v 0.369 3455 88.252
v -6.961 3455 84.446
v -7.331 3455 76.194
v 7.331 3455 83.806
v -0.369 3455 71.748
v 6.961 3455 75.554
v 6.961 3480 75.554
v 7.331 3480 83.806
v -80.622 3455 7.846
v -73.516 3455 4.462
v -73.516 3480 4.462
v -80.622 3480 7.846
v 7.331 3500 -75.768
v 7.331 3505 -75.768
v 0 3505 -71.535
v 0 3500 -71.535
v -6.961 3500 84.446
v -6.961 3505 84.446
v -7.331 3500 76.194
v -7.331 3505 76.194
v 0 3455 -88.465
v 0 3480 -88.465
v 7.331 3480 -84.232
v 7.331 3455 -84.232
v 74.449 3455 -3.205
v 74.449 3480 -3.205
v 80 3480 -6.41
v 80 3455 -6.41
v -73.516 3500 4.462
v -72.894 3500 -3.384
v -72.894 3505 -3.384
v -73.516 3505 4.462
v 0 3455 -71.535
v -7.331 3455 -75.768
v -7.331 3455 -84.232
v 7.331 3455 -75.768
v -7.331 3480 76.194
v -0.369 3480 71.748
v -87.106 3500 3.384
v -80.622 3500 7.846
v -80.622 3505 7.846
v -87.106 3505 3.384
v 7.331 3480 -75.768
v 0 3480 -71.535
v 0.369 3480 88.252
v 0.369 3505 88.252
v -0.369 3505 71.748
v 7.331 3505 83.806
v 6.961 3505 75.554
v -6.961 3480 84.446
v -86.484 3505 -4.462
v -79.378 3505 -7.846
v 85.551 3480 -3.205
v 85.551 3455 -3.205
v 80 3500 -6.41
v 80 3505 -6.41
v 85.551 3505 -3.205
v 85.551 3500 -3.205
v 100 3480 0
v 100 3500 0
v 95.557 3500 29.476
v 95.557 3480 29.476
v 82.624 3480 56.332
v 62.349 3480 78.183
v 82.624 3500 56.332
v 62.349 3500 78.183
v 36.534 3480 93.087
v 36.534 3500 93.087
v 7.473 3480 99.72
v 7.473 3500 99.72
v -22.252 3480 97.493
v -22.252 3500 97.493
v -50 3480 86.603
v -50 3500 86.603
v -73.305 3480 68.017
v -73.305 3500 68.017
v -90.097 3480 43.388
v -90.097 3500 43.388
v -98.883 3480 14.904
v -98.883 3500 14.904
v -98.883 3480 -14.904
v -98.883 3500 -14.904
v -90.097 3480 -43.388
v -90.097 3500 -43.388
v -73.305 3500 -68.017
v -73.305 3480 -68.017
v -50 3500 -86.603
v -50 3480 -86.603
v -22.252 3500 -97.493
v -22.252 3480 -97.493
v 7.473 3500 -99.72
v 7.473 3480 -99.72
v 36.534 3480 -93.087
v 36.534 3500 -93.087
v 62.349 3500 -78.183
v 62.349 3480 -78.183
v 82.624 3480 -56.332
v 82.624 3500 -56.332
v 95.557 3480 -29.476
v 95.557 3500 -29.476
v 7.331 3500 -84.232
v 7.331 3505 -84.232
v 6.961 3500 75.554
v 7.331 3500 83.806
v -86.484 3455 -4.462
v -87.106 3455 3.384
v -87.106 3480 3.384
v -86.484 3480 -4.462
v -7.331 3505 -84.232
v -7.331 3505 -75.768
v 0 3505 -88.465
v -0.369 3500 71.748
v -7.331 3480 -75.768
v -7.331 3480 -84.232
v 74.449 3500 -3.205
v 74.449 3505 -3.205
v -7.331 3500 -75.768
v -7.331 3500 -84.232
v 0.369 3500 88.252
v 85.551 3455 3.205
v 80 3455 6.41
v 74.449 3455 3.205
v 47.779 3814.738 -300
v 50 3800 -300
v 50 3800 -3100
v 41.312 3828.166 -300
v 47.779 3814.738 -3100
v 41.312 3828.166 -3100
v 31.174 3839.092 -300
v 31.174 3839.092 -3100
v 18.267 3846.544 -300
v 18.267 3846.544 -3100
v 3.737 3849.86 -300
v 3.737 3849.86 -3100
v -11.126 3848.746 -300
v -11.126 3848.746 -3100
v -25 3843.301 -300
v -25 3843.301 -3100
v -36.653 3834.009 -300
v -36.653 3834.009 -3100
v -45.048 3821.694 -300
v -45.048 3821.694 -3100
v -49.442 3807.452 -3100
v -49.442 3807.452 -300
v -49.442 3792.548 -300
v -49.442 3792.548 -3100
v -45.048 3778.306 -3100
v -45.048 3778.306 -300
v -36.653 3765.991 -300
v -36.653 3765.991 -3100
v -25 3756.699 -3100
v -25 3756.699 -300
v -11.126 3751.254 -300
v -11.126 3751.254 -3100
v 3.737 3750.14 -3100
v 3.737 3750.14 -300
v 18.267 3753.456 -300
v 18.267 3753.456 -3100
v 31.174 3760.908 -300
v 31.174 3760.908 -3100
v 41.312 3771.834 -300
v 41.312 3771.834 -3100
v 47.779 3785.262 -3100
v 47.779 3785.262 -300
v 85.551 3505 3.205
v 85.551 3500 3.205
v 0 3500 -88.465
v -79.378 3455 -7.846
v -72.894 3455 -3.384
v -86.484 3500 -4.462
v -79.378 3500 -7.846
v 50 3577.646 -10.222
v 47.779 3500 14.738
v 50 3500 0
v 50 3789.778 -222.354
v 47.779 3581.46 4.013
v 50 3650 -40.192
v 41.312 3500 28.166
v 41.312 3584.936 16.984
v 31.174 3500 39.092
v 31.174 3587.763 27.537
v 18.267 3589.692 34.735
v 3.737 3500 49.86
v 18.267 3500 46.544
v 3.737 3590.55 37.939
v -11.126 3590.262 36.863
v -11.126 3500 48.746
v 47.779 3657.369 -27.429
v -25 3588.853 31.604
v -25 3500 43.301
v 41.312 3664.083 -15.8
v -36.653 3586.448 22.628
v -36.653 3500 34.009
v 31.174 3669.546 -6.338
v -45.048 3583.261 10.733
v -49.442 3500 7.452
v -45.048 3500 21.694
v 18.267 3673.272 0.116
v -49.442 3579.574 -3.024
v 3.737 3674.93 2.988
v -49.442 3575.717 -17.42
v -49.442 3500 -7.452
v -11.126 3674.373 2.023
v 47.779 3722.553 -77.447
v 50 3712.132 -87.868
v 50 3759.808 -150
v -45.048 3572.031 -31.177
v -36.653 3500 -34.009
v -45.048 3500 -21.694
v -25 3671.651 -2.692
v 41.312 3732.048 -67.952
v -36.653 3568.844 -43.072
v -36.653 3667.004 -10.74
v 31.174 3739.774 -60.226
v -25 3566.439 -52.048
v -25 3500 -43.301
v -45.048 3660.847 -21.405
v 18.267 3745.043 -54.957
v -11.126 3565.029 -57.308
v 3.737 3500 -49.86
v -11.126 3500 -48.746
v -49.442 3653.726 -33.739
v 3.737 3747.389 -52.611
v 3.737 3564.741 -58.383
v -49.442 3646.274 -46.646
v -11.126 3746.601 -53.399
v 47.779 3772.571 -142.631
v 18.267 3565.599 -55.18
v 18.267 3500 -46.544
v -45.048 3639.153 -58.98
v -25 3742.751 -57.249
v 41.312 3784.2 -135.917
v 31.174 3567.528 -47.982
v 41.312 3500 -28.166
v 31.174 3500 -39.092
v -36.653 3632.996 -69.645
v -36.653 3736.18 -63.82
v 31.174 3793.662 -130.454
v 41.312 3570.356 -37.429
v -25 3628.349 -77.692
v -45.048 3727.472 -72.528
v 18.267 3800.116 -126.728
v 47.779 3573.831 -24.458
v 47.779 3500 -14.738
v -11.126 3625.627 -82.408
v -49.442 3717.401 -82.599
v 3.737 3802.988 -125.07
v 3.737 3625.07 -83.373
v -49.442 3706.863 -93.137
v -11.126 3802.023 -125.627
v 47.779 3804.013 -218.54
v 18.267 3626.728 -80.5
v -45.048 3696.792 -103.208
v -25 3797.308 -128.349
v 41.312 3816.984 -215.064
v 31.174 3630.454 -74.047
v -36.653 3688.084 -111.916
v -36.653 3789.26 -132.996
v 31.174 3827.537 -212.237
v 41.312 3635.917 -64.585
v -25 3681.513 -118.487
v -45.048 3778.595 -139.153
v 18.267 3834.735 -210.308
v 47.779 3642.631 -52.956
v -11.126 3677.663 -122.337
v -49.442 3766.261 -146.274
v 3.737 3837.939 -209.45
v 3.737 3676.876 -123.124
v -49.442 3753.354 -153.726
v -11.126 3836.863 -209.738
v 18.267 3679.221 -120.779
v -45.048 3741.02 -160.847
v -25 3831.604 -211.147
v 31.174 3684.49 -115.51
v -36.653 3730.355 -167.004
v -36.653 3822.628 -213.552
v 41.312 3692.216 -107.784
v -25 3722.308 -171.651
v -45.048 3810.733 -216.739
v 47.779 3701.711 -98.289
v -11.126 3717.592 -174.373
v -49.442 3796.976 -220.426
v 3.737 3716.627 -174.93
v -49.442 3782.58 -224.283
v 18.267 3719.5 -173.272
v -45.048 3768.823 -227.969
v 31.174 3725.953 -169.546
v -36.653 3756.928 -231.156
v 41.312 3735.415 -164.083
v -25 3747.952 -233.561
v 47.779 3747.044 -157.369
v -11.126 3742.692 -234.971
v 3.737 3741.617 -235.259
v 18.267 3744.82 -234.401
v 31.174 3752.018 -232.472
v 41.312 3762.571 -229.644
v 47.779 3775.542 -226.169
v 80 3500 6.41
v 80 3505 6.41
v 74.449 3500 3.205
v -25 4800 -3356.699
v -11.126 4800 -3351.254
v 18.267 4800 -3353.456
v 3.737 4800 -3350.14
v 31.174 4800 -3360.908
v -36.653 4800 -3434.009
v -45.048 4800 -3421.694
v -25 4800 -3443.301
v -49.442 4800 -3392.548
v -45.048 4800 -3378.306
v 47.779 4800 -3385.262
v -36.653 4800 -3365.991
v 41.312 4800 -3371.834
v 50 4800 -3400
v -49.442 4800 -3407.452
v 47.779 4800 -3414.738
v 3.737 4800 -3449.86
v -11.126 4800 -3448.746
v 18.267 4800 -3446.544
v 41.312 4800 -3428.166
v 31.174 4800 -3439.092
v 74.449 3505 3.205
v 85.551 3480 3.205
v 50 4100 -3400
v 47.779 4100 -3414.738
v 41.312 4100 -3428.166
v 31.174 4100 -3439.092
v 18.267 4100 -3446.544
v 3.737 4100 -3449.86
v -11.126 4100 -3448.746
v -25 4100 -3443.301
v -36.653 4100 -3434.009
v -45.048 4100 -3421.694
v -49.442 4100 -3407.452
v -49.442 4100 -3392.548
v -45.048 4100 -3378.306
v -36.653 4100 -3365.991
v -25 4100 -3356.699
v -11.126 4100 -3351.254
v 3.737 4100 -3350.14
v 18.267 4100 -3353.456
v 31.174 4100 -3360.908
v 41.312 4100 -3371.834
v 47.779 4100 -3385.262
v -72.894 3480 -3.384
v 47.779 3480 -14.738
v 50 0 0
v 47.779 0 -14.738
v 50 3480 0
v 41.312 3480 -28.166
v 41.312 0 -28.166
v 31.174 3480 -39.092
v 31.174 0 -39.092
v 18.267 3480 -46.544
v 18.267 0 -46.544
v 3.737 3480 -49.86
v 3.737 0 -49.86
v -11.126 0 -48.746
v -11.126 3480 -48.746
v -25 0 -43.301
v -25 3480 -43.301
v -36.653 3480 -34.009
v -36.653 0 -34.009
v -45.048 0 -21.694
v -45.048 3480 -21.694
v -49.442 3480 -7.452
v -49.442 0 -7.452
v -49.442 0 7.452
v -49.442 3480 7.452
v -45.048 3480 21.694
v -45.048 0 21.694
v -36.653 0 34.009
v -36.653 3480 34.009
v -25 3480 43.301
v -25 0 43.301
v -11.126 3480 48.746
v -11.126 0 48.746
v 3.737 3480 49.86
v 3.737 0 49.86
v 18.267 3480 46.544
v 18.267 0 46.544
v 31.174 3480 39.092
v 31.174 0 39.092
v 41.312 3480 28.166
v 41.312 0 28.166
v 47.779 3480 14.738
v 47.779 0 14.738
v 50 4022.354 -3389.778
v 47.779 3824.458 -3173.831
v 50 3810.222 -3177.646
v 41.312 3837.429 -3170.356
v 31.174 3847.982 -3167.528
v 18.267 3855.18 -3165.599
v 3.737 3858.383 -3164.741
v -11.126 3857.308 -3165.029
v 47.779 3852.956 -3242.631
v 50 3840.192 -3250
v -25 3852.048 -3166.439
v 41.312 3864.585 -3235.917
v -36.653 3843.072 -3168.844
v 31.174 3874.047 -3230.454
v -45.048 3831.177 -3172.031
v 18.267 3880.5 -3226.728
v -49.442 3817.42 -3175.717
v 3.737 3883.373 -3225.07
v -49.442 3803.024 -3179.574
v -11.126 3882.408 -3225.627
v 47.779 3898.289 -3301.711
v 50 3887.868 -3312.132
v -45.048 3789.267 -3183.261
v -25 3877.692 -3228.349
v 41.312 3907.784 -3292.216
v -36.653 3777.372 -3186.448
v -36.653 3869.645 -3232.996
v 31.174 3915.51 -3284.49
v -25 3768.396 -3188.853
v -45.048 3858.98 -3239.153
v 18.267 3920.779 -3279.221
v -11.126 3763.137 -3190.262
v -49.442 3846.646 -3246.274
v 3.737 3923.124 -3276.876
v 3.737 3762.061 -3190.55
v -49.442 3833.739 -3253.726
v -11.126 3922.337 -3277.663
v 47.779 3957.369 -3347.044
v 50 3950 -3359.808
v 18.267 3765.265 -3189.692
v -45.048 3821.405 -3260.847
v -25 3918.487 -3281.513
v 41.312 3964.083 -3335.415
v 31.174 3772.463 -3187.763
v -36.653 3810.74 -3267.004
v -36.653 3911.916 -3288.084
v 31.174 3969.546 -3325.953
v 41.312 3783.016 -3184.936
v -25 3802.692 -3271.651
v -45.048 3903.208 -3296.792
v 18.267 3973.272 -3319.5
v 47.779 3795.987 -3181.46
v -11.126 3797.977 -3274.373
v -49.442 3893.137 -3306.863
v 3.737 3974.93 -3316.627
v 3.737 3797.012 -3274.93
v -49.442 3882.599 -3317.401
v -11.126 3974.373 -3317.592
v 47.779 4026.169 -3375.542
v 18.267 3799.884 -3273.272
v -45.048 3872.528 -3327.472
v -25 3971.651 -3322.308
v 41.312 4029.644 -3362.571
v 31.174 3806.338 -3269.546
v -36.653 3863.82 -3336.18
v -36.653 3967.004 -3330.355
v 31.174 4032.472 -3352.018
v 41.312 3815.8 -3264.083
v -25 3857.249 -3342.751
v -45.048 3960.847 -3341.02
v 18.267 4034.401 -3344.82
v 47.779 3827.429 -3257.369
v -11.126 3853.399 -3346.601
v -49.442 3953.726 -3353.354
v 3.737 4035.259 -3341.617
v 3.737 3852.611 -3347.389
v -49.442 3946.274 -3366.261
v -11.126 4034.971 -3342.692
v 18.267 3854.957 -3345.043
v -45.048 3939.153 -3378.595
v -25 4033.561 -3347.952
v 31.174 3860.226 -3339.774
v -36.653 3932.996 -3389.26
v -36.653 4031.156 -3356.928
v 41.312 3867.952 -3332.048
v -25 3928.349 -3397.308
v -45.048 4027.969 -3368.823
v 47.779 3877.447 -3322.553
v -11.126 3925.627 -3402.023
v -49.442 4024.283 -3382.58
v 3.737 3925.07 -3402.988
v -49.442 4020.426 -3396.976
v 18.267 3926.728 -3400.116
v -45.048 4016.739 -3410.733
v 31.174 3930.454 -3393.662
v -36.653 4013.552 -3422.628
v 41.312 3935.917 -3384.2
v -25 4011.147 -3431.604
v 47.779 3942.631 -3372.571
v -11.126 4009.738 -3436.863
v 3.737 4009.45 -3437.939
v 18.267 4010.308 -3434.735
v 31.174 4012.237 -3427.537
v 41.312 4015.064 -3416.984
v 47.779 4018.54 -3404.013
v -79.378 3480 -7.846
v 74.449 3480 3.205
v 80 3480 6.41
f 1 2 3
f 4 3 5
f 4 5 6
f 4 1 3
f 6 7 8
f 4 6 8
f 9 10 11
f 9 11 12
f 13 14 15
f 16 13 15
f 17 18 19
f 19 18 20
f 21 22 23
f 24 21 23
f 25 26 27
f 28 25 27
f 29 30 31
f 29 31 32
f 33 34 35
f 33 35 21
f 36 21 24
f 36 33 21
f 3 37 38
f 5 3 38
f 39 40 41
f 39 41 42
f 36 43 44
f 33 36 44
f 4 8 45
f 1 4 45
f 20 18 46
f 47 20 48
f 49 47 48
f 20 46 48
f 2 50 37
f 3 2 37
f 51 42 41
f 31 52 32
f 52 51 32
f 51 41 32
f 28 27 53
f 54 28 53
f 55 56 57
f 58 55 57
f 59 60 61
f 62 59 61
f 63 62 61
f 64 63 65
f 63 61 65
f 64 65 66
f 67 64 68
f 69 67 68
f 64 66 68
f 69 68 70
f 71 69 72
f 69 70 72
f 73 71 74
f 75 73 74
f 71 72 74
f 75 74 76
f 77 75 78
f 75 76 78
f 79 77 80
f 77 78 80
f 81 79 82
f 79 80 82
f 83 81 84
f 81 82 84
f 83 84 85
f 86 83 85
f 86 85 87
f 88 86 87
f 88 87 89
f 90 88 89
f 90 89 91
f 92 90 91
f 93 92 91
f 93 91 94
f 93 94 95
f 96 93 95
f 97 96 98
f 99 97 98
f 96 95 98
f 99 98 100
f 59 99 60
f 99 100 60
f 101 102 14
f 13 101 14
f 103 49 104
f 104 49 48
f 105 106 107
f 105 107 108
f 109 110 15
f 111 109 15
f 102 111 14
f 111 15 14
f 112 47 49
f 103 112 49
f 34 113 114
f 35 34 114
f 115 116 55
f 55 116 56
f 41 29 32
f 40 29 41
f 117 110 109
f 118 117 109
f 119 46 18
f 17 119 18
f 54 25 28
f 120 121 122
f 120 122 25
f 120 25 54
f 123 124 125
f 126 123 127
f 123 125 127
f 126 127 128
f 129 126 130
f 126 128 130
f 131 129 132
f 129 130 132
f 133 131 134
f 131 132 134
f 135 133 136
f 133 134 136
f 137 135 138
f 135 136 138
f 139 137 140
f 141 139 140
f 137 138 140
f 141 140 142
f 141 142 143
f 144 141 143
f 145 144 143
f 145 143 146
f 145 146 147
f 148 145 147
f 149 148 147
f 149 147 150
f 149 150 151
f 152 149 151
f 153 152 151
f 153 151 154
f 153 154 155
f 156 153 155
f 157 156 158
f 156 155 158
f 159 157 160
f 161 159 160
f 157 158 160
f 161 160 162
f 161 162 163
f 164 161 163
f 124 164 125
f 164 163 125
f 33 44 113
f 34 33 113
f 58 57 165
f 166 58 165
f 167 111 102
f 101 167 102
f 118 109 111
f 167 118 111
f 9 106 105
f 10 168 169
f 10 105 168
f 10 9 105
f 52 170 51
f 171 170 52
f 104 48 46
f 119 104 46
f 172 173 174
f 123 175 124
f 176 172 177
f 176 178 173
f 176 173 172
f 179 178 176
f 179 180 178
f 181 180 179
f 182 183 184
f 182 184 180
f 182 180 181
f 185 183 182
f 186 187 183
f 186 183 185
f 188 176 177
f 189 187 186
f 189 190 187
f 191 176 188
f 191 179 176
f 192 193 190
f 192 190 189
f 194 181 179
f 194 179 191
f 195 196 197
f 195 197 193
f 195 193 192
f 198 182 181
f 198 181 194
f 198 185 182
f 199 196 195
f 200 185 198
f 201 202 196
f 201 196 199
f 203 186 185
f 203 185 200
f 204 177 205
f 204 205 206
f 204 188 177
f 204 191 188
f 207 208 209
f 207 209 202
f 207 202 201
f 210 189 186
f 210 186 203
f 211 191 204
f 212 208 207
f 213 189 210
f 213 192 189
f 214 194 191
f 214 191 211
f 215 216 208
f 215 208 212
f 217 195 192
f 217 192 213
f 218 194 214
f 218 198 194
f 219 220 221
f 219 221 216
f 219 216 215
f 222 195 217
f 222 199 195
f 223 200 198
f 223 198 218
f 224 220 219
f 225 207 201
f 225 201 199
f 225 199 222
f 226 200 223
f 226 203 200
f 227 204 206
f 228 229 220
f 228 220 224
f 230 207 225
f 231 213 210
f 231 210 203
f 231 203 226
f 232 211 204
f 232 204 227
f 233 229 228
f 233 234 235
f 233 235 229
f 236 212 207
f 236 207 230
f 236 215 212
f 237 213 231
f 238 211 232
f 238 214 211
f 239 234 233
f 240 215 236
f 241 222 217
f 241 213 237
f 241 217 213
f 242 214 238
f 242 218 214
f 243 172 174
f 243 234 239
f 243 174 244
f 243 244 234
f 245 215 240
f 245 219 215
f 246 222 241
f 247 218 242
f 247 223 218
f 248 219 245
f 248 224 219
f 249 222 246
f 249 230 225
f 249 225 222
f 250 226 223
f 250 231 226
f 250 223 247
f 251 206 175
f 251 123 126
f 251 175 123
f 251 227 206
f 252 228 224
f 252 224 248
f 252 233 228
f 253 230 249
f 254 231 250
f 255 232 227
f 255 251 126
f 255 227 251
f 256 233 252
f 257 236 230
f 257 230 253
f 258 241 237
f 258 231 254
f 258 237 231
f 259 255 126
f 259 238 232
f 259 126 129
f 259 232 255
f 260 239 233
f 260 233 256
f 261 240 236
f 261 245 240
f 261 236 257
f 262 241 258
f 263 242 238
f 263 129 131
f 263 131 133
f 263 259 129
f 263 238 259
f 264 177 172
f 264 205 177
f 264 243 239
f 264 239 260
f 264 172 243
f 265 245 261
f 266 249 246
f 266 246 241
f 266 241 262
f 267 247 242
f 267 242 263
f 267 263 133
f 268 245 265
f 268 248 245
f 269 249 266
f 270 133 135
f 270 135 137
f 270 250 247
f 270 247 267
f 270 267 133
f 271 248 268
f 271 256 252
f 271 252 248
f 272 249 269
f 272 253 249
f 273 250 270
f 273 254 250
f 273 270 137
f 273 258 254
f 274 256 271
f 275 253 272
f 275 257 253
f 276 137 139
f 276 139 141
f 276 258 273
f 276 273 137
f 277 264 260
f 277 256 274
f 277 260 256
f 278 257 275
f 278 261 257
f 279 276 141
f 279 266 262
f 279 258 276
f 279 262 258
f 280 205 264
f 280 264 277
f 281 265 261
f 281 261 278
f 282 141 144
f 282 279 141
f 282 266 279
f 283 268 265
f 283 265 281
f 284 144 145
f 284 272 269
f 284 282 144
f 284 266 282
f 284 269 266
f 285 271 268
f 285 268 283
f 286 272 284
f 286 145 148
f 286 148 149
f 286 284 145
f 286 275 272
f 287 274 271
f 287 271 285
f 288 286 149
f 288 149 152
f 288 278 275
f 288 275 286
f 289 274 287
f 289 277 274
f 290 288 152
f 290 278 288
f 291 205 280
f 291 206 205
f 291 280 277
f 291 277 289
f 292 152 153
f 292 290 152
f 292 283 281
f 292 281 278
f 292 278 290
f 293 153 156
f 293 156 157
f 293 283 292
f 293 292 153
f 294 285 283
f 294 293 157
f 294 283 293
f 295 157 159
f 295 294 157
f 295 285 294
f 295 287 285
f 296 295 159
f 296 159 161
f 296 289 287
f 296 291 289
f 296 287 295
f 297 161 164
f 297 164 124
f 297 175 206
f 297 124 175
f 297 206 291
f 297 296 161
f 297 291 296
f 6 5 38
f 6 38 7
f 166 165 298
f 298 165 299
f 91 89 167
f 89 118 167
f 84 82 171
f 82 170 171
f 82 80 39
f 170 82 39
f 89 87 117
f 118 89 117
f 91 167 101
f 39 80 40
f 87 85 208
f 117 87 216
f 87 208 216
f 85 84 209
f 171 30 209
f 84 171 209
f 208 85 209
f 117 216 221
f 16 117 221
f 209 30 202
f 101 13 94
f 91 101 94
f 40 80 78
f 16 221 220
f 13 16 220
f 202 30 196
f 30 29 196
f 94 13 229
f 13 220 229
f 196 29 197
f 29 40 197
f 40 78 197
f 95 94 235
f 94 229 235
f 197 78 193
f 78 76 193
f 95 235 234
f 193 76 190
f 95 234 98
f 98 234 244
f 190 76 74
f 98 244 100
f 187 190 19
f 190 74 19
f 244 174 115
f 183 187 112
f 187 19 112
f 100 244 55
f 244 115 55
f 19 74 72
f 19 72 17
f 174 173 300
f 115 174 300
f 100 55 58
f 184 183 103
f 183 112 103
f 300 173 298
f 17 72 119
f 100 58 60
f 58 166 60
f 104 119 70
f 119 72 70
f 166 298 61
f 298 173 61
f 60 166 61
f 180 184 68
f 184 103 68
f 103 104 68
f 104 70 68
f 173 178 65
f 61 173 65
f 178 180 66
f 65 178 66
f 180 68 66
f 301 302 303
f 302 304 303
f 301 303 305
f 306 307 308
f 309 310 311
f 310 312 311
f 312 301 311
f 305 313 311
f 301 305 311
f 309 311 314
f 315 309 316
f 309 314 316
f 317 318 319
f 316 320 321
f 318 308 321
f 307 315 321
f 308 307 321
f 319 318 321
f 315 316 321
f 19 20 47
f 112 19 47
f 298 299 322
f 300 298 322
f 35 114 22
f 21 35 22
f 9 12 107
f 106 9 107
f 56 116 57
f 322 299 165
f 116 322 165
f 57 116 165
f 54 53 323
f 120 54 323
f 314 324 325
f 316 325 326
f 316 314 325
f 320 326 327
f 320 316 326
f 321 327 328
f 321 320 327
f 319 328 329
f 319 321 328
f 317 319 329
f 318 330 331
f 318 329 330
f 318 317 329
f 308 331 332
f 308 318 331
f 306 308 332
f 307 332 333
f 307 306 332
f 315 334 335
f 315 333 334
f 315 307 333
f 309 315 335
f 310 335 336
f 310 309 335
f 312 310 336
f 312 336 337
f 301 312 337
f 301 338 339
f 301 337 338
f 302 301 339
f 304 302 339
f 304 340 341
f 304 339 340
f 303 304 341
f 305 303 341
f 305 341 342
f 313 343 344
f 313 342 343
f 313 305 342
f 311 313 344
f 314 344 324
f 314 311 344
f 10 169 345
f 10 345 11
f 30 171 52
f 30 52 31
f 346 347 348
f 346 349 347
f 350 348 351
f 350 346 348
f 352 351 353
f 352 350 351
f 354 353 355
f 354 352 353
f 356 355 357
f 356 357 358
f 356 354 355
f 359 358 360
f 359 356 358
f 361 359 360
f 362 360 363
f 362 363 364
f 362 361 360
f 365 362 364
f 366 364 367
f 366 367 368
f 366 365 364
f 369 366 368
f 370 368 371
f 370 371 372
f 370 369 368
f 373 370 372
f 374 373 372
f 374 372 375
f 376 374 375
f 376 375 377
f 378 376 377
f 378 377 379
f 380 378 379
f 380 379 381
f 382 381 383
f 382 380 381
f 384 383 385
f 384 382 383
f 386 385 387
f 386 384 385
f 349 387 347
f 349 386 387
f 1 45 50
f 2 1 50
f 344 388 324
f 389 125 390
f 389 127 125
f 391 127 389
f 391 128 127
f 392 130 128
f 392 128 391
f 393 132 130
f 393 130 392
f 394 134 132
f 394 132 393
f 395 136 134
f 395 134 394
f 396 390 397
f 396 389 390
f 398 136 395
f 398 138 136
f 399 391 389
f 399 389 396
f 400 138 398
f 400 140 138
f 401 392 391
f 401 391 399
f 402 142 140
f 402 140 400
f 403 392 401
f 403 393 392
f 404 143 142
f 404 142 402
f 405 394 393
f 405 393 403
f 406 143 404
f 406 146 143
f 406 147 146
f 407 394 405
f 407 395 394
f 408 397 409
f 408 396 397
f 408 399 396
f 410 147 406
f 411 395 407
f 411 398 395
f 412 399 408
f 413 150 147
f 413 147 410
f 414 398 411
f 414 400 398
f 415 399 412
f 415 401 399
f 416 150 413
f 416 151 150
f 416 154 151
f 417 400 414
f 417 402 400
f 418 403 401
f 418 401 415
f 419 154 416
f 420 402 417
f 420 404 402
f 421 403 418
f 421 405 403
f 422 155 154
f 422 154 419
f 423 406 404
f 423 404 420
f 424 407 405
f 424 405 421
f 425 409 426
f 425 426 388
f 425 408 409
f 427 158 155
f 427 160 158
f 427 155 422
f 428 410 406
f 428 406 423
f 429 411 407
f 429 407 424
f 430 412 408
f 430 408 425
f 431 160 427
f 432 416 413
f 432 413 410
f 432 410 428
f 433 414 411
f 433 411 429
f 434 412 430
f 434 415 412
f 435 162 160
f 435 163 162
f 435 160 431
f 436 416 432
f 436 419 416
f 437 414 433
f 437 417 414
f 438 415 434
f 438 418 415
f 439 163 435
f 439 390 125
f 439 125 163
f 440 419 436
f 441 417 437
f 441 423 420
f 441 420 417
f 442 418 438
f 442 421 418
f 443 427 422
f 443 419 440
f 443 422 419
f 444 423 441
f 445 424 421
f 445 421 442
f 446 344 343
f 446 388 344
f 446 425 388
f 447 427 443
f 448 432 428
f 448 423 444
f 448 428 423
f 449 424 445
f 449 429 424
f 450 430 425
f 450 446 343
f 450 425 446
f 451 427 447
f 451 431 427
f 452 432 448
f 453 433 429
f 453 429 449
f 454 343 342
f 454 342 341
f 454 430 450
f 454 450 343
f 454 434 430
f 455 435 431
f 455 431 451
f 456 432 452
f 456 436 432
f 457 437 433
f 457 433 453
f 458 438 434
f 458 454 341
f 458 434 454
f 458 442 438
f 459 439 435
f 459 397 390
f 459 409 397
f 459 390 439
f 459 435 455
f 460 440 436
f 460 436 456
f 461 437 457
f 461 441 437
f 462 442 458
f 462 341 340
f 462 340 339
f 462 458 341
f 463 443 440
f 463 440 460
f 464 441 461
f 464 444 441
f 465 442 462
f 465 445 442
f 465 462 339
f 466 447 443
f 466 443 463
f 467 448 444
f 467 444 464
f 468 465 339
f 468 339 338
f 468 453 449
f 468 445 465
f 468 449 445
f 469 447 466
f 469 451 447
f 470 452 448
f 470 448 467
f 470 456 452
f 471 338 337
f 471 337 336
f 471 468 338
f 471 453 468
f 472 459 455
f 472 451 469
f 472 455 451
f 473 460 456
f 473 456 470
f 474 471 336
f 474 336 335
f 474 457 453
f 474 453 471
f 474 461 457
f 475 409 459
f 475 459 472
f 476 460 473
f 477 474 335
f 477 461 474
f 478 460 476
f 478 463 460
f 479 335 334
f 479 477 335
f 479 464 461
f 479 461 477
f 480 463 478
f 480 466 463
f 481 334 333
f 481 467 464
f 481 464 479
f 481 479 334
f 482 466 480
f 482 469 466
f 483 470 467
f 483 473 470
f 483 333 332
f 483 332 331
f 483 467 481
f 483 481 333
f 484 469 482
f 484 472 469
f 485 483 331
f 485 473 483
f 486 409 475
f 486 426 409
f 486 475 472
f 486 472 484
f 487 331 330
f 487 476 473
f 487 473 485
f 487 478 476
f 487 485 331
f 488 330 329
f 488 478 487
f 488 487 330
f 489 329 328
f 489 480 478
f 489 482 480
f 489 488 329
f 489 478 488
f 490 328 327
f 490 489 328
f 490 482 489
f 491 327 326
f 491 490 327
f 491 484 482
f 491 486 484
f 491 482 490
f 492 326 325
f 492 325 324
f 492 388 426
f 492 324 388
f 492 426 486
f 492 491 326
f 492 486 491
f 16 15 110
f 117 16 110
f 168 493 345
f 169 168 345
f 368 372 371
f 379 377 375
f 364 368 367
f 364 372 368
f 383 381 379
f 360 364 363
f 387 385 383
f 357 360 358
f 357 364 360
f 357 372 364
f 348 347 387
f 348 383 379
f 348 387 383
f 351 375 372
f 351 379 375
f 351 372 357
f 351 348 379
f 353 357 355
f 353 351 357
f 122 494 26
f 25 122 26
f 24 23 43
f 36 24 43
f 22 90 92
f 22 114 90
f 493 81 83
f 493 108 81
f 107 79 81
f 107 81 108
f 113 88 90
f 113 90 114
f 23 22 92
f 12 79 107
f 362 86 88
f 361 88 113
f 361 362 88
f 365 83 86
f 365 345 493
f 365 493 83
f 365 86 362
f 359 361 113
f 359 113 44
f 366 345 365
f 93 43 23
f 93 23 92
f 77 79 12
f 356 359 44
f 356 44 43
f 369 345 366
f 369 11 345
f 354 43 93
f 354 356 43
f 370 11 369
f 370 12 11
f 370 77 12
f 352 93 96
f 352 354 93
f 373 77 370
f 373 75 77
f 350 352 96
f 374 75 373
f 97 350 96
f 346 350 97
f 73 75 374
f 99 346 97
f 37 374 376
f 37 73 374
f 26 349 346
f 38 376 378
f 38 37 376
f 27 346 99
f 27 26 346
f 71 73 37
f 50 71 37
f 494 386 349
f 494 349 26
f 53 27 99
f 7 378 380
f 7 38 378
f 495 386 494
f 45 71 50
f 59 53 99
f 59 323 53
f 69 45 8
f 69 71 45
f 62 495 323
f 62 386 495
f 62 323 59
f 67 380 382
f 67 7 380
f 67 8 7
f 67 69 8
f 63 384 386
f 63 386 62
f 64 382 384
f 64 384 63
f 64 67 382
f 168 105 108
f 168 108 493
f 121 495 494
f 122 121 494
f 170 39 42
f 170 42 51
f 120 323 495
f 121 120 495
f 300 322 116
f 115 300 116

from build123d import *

# Parameters (mm, degrees)
F0_R     = 50
F4_R     = 100
F5_DEPTH = 20
F7_DEPTH = 25


with BuildPart() as f2:
    # F2: sweep along a path in F1
    with BuildLine(Plane.YZ) as f2_path:
        Line((0, 0), (3500, 0))
        ThreePointArc((3500, 0), (3712.132034, -87.867966), (3800, -300))
        Line((3800, -300), (3800, -3100))
        ThreePointArc((3800, -3100), (3887.867966, -3312.132034), (4100, -3400))
        Line((4100, -3400), (4800, -3400))
    # F0 (on Front) → F2 (sweep)
    with BuildSketch(Plane.XZ):
        Circle(F0_R)
    sweep(path=f2_path.line)

    # F4 (on offset) → F5 (join)
    with BuildSketch(Plane.XZ.offset(-3500)):
        Circle(F4_R)
    extrude(amount=F5_DEPTH)

    # F6 (on face) → F7 (join, symmetric)
    with BuildSketch(Plane.XZ.offset(-3480)):
        Polygon((6.961374, 75.554451), (7.330645, 83.805952), (0.369271, 88.251501), (-6.961374, 84.445549), (-7.330645, 76.194048), (-0.369271, 71.748499), align=None)
        Polygon((85.551329, -3.205061), (85.551329, 3.205061), (80, 6.410123), (74.448671, 3.205061), (74.448671, -3.205061), (80, -6.410123), align=None)
        Polygon((7.330645, -84.23235), (7.330645, -75.76765), (0, -71.535301), (-7.330645, -75.76765), (-7.330645, -84.23235), (0, -88.464699), align=None)
        Polygon((-79.378061, -7.846037), (-72.894163, -3.384404), (-73.516102, 4.461633), (-80.621939, 7.846037), (-87.105837, 3.384404), (-86.483898, -4.461633), align=None)
    extrude(amount=F7_DEPTH, both=True)


solid = f2.part
